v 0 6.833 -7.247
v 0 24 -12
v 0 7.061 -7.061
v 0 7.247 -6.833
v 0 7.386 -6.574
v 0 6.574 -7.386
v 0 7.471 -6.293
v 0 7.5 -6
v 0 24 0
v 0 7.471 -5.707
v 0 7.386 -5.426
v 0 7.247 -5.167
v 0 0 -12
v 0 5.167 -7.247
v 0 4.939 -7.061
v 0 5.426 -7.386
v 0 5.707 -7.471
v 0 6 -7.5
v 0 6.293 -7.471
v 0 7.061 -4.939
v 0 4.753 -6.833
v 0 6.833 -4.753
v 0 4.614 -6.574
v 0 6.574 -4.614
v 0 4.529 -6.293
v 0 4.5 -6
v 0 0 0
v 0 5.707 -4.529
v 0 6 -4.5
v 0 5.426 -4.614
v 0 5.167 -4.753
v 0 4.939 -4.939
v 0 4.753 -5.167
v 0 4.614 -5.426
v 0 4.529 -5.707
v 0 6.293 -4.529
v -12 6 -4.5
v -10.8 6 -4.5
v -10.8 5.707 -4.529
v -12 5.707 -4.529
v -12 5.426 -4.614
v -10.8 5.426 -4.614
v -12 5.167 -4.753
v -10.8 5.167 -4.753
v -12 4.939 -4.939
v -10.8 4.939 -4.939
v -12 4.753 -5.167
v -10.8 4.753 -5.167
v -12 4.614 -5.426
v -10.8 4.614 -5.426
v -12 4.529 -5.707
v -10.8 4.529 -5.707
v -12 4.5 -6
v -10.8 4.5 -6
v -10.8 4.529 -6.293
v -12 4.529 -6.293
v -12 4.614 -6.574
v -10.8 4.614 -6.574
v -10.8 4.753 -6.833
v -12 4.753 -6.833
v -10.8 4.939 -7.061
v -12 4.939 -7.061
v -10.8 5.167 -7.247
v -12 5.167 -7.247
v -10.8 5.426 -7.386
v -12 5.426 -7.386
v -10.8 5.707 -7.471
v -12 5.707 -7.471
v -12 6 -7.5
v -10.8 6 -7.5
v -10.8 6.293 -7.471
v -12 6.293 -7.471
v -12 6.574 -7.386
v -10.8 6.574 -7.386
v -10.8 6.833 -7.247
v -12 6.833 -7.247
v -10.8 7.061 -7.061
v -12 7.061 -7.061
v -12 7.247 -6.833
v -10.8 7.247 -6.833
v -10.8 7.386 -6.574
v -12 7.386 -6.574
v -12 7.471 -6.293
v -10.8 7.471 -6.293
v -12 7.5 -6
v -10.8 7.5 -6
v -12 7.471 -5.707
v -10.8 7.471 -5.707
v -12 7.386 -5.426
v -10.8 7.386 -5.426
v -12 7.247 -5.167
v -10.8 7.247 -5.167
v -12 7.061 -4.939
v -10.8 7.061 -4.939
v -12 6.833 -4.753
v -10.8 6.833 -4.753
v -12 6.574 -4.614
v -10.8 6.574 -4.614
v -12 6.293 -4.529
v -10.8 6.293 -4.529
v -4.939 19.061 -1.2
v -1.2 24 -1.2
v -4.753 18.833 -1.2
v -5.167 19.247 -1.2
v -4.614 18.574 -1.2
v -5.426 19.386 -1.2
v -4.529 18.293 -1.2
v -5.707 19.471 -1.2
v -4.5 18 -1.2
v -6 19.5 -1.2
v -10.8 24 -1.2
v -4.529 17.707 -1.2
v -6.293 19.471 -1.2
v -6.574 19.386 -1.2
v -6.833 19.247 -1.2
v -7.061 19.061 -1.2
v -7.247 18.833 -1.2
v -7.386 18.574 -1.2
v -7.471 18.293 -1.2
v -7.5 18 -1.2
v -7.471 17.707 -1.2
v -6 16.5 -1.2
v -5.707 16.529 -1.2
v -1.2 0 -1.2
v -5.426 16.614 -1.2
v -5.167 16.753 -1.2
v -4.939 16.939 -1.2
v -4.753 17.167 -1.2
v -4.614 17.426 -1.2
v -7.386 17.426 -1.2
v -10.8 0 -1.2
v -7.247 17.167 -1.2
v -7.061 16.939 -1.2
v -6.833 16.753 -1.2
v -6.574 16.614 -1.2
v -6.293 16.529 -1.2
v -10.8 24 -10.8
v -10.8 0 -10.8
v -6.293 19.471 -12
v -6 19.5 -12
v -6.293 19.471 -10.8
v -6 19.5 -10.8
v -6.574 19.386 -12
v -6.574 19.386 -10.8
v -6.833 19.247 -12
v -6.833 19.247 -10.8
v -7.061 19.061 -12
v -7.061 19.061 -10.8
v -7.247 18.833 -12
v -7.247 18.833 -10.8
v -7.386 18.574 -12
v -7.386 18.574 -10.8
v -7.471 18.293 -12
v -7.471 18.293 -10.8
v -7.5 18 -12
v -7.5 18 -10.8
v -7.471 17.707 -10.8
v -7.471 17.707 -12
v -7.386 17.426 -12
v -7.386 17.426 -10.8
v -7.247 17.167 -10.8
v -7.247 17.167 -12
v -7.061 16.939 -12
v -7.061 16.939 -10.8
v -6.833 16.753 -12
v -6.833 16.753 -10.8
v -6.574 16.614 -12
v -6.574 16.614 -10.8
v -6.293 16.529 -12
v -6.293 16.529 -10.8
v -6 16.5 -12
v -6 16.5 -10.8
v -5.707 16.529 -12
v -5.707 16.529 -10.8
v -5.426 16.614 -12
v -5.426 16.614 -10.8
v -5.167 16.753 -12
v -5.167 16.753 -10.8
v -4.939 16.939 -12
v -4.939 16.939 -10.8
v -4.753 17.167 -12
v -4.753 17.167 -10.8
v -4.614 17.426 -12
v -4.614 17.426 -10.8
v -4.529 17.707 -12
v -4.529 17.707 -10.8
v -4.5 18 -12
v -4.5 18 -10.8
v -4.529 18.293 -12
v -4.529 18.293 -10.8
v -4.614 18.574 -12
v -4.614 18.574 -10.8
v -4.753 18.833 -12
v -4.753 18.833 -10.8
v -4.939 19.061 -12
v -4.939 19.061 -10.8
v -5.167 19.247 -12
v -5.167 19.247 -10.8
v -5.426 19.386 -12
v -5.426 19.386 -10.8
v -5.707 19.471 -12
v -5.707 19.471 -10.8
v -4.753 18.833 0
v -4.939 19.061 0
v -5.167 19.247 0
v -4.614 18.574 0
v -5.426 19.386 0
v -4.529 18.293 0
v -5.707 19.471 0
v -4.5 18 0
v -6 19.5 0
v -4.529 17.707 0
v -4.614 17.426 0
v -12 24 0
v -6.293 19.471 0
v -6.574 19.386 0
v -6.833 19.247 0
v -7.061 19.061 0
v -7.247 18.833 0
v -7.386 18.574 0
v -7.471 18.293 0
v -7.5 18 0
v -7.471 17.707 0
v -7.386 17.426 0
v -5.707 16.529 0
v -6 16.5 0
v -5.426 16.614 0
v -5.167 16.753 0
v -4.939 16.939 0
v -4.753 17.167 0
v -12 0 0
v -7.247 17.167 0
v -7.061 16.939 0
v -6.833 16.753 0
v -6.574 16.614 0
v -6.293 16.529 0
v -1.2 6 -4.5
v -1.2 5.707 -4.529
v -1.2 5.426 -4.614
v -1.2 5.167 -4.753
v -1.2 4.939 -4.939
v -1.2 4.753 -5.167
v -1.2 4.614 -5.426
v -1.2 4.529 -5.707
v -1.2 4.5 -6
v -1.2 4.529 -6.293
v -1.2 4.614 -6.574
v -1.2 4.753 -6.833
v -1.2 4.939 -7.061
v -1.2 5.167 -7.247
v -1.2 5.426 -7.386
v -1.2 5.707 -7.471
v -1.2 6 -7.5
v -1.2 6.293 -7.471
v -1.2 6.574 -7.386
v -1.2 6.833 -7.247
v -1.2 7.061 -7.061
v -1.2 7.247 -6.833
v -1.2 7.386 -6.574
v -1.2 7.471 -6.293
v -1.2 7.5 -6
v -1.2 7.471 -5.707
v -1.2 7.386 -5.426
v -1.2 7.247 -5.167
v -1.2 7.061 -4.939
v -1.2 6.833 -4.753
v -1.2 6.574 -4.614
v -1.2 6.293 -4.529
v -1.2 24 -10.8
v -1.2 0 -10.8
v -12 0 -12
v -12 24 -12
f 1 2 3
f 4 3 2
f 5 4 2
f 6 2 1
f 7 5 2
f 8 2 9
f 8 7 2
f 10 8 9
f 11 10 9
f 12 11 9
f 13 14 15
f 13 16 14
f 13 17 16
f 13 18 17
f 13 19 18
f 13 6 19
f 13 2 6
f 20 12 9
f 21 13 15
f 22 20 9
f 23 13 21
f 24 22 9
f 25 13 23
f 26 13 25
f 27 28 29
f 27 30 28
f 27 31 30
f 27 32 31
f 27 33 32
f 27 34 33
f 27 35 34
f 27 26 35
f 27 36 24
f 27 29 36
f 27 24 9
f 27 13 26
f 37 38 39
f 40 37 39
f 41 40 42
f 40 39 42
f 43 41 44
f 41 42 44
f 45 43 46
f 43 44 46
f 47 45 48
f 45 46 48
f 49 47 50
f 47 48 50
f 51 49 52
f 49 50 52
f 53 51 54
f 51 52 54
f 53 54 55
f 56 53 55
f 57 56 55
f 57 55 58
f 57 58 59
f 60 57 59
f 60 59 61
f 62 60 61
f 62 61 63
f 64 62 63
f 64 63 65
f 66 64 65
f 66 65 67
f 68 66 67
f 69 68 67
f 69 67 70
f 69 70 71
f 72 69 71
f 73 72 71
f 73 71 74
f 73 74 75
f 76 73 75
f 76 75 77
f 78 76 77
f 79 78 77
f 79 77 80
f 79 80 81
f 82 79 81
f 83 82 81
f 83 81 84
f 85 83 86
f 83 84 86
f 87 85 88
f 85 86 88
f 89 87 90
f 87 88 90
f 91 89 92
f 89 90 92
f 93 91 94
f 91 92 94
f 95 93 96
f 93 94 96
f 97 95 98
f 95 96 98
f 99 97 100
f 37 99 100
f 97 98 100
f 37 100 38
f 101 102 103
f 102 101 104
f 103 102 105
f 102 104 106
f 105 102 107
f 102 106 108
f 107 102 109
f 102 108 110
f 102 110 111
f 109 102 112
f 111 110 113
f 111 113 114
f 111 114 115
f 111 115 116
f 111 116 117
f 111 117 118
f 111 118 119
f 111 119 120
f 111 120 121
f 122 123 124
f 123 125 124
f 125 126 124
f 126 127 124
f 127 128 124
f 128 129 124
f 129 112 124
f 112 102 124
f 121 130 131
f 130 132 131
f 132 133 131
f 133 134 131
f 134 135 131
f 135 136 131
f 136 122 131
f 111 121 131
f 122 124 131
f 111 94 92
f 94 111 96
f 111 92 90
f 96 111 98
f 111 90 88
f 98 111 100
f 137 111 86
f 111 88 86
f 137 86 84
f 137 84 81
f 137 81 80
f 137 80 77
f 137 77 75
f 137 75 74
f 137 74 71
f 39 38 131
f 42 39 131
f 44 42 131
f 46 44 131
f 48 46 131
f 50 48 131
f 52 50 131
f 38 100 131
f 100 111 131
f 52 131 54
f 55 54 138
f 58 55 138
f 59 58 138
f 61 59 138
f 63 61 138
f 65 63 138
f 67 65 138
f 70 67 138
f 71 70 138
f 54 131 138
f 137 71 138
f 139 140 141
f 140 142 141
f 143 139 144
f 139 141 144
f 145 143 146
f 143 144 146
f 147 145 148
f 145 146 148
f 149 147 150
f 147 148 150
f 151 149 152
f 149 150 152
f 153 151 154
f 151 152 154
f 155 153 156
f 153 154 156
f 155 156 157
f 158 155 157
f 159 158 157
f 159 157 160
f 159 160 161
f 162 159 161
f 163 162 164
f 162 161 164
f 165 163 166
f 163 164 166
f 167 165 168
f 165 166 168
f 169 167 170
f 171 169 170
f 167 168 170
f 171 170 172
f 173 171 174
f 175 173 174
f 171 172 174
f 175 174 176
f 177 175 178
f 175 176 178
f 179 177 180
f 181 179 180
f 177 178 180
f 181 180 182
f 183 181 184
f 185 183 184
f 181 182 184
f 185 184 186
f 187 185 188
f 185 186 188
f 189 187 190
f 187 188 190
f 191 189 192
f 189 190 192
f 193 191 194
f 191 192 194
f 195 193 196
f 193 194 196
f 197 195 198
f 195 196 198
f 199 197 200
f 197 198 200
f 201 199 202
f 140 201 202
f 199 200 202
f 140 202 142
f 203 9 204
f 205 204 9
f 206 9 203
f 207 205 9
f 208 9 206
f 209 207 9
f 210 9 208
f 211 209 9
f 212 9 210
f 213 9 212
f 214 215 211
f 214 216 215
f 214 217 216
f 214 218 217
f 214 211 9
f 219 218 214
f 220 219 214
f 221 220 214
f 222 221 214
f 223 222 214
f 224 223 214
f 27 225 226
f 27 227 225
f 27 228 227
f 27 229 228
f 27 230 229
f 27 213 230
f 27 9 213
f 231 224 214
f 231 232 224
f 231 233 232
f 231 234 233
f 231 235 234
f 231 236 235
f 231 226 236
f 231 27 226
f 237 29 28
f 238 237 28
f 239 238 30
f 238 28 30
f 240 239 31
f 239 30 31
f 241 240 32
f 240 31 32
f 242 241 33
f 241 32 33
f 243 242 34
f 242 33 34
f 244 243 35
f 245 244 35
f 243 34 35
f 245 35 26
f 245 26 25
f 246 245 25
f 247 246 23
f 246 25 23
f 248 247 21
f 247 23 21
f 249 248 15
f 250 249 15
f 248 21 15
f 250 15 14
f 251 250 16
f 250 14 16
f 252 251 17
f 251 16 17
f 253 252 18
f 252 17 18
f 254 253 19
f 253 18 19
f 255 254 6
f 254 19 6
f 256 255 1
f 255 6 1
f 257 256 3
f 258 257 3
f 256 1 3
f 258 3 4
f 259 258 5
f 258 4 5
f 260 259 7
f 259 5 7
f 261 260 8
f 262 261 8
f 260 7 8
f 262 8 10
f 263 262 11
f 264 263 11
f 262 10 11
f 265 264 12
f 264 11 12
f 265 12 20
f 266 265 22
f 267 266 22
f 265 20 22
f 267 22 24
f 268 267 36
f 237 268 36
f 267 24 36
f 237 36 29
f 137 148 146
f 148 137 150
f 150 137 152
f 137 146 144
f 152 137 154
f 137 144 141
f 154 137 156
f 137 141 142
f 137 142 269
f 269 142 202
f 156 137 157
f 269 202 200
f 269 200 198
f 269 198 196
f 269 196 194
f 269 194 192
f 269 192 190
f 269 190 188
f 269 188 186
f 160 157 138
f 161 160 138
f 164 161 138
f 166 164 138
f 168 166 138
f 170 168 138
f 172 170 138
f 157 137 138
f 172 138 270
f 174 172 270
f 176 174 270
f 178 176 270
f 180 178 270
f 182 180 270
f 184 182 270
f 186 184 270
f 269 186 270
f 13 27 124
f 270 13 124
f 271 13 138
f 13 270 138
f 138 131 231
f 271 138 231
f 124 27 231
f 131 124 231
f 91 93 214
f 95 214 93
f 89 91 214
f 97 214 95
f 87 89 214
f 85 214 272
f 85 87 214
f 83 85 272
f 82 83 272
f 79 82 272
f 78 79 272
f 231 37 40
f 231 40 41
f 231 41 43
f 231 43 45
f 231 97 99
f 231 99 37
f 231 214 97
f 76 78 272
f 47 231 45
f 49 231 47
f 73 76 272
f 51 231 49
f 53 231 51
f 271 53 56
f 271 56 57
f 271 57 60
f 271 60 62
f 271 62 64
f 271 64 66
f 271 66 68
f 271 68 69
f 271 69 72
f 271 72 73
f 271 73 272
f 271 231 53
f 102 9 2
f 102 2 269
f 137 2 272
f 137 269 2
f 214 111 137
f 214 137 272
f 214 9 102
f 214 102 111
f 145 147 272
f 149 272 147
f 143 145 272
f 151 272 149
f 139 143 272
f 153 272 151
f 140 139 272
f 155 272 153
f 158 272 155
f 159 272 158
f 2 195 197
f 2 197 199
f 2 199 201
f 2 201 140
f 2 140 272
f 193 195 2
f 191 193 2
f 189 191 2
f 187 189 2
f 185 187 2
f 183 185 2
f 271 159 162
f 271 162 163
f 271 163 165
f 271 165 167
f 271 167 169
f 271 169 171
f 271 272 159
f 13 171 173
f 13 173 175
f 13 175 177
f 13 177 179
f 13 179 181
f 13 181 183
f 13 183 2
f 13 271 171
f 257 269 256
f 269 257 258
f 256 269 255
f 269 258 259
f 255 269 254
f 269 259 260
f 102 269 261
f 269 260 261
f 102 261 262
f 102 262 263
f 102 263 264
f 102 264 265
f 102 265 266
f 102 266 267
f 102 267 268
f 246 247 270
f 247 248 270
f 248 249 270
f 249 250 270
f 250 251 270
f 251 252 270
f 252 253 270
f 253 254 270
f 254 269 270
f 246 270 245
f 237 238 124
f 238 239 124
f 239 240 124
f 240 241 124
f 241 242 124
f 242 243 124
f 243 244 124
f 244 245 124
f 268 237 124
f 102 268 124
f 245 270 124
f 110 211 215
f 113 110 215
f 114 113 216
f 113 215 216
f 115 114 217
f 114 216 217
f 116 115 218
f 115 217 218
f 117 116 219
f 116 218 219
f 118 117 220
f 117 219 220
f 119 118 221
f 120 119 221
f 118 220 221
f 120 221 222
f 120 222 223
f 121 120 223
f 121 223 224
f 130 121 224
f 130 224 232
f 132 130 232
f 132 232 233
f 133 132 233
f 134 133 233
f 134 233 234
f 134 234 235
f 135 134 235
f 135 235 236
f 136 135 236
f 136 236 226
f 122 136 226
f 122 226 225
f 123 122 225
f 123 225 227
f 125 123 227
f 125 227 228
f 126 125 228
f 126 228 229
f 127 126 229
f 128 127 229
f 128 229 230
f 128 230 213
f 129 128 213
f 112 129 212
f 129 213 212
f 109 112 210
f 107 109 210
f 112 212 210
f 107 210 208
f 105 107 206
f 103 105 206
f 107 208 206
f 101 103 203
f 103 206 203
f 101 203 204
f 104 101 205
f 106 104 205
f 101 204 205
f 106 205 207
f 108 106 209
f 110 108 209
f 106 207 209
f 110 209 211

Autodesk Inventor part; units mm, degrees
ref_plane "YZ Plane" through (0, 0, 0) normal (1, 0, 0) x (0, 1, 0)
ref_plane "XZ Plane" through (0, 0, 0) normal (0, 1, 0) x (-1, 0, 0)
ref_plane "XY Plane" through (0, 0, 0) normal (0, 0, 1) x (1, 0, 0)
sketch "スケッチ1" plane through (0, 0, 0) normal (0, 1, 0) x (-1, 0, 0)
  line L0 (0, 0) -> (12, 0)
  line L1 (12, 0) -> (12, -12)
  line L2 (12, -12) -> (0, -12)
  line L3 (0, -12) -> (0, 0)
  line L4 (1.2, -1.2) -> (10.8, -1.2)
  line L5 (10.8, -1.2) -> (10.8, -10.8)
  line L6 (10.8, -10.8) -> (1.2, -10.8)
  line L7 (1.2, -10.8) -> (1.2, -1.2)
  dimension "d0" = 12
  dimension "d1" = 12
  dimension "d2" = 9.6
  dimension "d3" = 9.6
  dimension "d4" = 1.2
  dimension "d5" = 1.2
extrude "押し出し1" add sketch "スケッチ1" along normal blind 24
sketch "スケッチ2" plane through (-12, 0, -12) normal (-1, 0, 0) x (0, 0, 1)
  line L0 (0, 0) -> (12, 0) projected
  line L1 (0, 0) -> (0, 24) projected
  point P0 (6, 6)
  dimension "d8" = 6
  dimension "d9" = 6
hole "穴1" at (-12, 6, -6) direction (1, 0, 0) diameter 3 end through all
sketch "スケッチ3" plane through (0, 0, -12) normal (0, 0, -1) x (-1, 0, 0)
  line L0 (0, 0) -> (0, 24) projected
  line L1 (0, 24) -> (12, 24) projected
  point P0 (6, 18)
  dimension "d17" = 6
  dimension "d18" = 6
hole "穴2" at (-6, 18, -12) direction (0, 0, 1) diameter 3 end through all
properties part number "前後直動12x12x24" material "アルミニウム 6061"
